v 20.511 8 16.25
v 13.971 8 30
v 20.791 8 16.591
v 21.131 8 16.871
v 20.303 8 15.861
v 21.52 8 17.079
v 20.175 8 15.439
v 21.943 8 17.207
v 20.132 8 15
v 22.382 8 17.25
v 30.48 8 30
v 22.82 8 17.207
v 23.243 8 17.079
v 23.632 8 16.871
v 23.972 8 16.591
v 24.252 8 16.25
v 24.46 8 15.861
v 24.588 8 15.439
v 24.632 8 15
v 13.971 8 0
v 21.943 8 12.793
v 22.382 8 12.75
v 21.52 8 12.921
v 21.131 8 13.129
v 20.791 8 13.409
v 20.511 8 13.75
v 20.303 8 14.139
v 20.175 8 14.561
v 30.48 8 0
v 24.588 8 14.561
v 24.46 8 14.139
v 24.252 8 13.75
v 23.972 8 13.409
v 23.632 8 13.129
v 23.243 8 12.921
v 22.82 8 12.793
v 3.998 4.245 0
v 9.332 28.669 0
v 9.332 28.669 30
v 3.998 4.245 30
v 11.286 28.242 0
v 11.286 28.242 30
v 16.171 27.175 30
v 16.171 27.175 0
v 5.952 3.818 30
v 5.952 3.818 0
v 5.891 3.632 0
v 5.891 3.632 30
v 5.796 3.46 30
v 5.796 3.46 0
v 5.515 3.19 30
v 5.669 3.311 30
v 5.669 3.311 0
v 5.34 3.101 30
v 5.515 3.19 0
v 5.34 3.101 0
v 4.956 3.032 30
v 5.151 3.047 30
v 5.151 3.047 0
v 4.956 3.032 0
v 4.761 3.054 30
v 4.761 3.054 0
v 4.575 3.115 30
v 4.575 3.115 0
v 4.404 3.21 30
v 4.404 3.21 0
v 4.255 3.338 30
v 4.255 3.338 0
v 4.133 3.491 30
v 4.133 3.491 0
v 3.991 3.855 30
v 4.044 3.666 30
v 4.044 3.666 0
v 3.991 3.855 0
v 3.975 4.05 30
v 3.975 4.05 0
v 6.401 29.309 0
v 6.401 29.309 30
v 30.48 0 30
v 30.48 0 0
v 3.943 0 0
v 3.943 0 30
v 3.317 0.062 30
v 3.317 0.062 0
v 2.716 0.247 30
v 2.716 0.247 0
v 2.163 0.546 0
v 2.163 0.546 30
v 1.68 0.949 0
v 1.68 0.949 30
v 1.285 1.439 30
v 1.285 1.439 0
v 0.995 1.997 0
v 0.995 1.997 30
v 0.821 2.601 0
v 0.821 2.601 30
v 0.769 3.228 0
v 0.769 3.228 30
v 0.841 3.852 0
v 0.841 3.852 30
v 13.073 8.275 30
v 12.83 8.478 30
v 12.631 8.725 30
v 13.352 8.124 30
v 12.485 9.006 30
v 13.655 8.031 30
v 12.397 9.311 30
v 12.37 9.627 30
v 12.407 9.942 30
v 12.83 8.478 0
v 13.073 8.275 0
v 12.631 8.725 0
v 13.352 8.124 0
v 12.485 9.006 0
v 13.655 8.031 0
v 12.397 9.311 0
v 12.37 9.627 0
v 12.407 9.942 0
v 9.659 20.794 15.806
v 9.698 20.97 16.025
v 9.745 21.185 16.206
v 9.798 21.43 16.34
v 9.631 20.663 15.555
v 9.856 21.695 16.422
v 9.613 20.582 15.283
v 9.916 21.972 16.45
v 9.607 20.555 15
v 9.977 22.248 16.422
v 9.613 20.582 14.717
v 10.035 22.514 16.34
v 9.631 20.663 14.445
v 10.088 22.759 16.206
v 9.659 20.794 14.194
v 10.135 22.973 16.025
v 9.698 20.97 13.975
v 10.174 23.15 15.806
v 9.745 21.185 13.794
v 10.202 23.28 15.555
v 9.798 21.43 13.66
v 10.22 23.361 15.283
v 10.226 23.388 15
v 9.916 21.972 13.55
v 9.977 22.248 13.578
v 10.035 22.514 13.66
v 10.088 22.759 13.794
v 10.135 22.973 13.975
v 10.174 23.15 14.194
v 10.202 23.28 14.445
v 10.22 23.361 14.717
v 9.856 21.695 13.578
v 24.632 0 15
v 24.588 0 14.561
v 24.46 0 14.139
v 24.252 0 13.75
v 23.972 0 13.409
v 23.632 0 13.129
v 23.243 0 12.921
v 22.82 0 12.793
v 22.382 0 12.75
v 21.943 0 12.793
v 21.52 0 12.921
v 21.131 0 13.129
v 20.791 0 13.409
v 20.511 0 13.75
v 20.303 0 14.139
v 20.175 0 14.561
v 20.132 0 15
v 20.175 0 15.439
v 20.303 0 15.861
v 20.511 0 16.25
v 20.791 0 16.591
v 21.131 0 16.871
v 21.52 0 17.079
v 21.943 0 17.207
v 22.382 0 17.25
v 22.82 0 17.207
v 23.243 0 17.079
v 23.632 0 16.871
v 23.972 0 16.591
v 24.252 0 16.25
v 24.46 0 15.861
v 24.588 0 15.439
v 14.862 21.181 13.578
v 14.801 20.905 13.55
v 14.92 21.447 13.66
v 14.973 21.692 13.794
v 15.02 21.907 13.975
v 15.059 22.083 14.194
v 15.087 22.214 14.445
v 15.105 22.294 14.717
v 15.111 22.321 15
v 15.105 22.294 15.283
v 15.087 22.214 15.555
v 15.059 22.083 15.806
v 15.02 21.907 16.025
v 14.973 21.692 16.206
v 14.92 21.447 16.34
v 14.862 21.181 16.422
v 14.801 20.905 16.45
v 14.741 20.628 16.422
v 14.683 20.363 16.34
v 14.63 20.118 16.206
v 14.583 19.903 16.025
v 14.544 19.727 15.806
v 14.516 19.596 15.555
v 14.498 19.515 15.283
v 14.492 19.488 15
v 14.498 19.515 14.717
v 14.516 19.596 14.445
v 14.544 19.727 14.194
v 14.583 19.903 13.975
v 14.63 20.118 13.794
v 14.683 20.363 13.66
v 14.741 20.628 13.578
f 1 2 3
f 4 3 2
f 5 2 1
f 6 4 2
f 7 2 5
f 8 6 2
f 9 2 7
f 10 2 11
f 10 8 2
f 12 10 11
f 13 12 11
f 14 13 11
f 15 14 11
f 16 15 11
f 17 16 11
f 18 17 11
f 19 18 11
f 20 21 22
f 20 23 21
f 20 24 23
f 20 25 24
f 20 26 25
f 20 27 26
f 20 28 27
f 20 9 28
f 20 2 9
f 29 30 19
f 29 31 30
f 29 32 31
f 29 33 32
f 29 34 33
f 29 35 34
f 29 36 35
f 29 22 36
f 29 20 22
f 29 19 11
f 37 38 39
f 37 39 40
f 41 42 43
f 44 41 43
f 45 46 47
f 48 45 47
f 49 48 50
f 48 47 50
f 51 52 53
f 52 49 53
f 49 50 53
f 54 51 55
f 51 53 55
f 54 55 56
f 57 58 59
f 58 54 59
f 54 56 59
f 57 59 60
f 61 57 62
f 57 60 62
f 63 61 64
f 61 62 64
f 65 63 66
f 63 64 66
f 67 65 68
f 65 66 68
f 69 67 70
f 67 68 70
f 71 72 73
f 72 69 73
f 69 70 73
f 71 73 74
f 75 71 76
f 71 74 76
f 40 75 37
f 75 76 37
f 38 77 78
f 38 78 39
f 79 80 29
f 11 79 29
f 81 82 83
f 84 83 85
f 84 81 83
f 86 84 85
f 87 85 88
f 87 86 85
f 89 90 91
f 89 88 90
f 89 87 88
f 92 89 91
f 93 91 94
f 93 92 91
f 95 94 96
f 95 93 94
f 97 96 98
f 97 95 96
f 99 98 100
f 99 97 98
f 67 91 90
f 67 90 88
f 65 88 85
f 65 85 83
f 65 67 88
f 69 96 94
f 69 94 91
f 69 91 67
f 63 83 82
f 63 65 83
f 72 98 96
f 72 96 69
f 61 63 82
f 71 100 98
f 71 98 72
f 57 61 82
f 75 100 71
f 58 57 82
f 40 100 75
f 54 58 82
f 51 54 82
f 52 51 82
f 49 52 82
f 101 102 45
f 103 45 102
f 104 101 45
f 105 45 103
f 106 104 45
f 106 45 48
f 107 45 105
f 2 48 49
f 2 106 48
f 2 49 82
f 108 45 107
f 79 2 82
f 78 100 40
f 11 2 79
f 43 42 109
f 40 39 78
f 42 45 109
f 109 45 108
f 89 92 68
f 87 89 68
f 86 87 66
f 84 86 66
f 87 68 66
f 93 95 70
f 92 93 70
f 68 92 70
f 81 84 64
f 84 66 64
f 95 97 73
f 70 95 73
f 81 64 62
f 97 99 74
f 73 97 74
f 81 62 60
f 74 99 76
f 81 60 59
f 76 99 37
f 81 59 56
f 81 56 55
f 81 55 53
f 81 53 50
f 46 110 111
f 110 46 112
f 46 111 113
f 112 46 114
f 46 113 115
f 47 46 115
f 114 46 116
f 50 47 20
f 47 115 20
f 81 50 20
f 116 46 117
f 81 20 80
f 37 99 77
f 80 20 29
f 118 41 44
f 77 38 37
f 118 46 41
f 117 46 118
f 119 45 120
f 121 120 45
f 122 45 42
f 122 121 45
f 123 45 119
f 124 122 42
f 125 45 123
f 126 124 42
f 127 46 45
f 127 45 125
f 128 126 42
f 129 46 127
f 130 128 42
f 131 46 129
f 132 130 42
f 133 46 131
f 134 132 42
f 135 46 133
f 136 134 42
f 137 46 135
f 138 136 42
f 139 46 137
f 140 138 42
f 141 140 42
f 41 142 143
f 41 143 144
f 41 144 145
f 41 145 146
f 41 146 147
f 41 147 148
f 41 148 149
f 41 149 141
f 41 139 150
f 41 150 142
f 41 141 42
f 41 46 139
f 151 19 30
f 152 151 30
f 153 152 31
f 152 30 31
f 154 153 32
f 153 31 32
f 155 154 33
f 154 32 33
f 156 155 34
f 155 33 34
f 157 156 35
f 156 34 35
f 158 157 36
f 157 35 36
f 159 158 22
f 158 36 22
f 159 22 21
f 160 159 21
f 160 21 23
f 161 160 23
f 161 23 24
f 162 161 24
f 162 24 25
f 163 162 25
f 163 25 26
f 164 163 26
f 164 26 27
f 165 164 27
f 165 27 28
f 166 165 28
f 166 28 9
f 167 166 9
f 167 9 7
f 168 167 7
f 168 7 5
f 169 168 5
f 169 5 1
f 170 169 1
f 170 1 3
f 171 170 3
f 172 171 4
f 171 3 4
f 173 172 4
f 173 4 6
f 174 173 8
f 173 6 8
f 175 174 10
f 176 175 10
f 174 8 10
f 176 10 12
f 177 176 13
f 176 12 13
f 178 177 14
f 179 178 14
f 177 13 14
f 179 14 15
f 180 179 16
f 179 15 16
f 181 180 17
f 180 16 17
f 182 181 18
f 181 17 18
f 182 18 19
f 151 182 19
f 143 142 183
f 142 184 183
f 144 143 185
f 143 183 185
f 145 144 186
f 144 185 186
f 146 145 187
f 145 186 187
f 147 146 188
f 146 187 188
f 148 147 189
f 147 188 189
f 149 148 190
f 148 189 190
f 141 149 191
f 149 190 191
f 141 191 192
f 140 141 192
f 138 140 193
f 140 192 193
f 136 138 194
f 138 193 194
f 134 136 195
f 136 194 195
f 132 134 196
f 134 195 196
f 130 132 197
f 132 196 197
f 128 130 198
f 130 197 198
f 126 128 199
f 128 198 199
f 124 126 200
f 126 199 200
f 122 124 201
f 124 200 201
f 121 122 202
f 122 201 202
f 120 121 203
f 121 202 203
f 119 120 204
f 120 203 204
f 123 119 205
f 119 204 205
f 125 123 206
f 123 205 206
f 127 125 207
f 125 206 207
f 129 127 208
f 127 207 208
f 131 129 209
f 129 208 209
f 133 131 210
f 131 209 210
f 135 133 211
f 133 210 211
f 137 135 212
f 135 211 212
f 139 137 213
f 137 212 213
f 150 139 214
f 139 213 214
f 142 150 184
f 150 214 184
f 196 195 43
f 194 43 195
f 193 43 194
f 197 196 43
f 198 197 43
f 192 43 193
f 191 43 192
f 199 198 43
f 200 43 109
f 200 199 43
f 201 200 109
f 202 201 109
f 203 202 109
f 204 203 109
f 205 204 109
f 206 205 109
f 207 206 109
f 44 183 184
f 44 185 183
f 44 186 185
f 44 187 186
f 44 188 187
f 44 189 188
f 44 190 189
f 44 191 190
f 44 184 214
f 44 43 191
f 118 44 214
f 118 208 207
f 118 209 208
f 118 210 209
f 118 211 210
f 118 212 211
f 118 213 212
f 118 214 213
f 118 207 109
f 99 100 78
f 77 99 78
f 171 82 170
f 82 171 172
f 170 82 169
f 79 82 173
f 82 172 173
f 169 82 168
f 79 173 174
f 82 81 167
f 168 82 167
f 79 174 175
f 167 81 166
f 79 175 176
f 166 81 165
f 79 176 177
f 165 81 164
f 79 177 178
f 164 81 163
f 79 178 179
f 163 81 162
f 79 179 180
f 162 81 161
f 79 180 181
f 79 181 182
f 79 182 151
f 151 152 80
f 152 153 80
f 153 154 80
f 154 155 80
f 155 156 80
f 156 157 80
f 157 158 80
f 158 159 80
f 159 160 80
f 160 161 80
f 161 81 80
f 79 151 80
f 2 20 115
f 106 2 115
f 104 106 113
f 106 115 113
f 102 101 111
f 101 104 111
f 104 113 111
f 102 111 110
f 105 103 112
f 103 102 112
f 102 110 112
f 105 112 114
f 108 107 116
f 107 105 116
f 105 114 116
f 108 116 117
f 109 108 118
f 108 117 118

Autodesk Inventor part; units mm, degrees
ref_plane "YZ Plane" through (0, 0, 0) normal (1, 0, 0) x (0, 1, 0)
ref_plane "XZ Plane" through (0, 0, 0) normal (0, 1, 0) x (-1, 0, 0)
ref_plane "XY Plane" through (0, 0, 0) normal (0, 0, 1) x (1, 0, 0)
sketch "Szkic1" plane through (0, 0, 0) normal (0, 0, 1) x (1, 0, 0)
  line L0 (0, -6.7527) -> (0, 35.3194) projected
  line L1 (0.8414, 3.8525) -> (6.4011, 29.3091)
  line L2 (6.4011, 29.3091) -> (9.3321, 28.669)
  line L3 (9.3321, 28.669) -> (3.9978, 4.2447)
  line L4 (5.9517, 3.818) -> (11.286, 28.2423)
  line L5 (11.286, 28.2423) -> (16.1709, 27.1754)
  arc A0 (3.9978, 4.2447) -> (5.9517, 3.818) centre (4.9747, 4.0314) ccw
  line L6 (16.1709, 27.1754) -> (12.4071, 9.942)
  line L7 (13.9707, 8) -> (30.48, 8)
  arc A1 (12.4071, 9.942) -> (13.9707, 8) centre (13.9707, 9.6005) ccw
  line L8 (3.9433, 0) -> (30.48, 0)
  line L9 (30.48, 0) -> (30.48, 8)
  arc A2 (0.8414, 3.8525) -> (3.9433, 0) centre (3.9433, 3.175) ccw
  point P0 (0, 0)
  dimension "d0" = 12.32
  dimension "d1" = 3
  dimension "d2" = 30
  dimension "d3" = 5
  dimension "d4" = 8
  dimension "d5" = 25
  dimension "d6" = 2
  dimension "d7" = 30.48
  dimension "d8" = 1.6005
  dimension "d9" = 3.175
extrude "Wyciągnięcie proste1" add sketch "Szkic1" along normal blind 30
sketch "Szkic2" plane through (13.9707, 8, 0) normal (0, 1, 0) x (1, 0, 0)
  circle A0 centre (8.4108, -15) radius 2.25
  point P0 (-13.9707, 0)
  dimension "d12" = 4.5
extrude "Wyciągnięcie proste2" cut sketch "Szkic2" against normal blind 30
sketch "Szkic3" plane through (16.1709, 27.1754, 30) normal (0.9769712, -0.2133714, 0) x (0, 0, -1)
  circle A0 centre (15, -6.4184) radius 1.45
  point P0 (30, -30)
  dimension "d15" = 2.9
extrude "Wyciągnięcie proste3" cut sketch "Szkic3" against normal up to next
properties part number "lustereczko"
